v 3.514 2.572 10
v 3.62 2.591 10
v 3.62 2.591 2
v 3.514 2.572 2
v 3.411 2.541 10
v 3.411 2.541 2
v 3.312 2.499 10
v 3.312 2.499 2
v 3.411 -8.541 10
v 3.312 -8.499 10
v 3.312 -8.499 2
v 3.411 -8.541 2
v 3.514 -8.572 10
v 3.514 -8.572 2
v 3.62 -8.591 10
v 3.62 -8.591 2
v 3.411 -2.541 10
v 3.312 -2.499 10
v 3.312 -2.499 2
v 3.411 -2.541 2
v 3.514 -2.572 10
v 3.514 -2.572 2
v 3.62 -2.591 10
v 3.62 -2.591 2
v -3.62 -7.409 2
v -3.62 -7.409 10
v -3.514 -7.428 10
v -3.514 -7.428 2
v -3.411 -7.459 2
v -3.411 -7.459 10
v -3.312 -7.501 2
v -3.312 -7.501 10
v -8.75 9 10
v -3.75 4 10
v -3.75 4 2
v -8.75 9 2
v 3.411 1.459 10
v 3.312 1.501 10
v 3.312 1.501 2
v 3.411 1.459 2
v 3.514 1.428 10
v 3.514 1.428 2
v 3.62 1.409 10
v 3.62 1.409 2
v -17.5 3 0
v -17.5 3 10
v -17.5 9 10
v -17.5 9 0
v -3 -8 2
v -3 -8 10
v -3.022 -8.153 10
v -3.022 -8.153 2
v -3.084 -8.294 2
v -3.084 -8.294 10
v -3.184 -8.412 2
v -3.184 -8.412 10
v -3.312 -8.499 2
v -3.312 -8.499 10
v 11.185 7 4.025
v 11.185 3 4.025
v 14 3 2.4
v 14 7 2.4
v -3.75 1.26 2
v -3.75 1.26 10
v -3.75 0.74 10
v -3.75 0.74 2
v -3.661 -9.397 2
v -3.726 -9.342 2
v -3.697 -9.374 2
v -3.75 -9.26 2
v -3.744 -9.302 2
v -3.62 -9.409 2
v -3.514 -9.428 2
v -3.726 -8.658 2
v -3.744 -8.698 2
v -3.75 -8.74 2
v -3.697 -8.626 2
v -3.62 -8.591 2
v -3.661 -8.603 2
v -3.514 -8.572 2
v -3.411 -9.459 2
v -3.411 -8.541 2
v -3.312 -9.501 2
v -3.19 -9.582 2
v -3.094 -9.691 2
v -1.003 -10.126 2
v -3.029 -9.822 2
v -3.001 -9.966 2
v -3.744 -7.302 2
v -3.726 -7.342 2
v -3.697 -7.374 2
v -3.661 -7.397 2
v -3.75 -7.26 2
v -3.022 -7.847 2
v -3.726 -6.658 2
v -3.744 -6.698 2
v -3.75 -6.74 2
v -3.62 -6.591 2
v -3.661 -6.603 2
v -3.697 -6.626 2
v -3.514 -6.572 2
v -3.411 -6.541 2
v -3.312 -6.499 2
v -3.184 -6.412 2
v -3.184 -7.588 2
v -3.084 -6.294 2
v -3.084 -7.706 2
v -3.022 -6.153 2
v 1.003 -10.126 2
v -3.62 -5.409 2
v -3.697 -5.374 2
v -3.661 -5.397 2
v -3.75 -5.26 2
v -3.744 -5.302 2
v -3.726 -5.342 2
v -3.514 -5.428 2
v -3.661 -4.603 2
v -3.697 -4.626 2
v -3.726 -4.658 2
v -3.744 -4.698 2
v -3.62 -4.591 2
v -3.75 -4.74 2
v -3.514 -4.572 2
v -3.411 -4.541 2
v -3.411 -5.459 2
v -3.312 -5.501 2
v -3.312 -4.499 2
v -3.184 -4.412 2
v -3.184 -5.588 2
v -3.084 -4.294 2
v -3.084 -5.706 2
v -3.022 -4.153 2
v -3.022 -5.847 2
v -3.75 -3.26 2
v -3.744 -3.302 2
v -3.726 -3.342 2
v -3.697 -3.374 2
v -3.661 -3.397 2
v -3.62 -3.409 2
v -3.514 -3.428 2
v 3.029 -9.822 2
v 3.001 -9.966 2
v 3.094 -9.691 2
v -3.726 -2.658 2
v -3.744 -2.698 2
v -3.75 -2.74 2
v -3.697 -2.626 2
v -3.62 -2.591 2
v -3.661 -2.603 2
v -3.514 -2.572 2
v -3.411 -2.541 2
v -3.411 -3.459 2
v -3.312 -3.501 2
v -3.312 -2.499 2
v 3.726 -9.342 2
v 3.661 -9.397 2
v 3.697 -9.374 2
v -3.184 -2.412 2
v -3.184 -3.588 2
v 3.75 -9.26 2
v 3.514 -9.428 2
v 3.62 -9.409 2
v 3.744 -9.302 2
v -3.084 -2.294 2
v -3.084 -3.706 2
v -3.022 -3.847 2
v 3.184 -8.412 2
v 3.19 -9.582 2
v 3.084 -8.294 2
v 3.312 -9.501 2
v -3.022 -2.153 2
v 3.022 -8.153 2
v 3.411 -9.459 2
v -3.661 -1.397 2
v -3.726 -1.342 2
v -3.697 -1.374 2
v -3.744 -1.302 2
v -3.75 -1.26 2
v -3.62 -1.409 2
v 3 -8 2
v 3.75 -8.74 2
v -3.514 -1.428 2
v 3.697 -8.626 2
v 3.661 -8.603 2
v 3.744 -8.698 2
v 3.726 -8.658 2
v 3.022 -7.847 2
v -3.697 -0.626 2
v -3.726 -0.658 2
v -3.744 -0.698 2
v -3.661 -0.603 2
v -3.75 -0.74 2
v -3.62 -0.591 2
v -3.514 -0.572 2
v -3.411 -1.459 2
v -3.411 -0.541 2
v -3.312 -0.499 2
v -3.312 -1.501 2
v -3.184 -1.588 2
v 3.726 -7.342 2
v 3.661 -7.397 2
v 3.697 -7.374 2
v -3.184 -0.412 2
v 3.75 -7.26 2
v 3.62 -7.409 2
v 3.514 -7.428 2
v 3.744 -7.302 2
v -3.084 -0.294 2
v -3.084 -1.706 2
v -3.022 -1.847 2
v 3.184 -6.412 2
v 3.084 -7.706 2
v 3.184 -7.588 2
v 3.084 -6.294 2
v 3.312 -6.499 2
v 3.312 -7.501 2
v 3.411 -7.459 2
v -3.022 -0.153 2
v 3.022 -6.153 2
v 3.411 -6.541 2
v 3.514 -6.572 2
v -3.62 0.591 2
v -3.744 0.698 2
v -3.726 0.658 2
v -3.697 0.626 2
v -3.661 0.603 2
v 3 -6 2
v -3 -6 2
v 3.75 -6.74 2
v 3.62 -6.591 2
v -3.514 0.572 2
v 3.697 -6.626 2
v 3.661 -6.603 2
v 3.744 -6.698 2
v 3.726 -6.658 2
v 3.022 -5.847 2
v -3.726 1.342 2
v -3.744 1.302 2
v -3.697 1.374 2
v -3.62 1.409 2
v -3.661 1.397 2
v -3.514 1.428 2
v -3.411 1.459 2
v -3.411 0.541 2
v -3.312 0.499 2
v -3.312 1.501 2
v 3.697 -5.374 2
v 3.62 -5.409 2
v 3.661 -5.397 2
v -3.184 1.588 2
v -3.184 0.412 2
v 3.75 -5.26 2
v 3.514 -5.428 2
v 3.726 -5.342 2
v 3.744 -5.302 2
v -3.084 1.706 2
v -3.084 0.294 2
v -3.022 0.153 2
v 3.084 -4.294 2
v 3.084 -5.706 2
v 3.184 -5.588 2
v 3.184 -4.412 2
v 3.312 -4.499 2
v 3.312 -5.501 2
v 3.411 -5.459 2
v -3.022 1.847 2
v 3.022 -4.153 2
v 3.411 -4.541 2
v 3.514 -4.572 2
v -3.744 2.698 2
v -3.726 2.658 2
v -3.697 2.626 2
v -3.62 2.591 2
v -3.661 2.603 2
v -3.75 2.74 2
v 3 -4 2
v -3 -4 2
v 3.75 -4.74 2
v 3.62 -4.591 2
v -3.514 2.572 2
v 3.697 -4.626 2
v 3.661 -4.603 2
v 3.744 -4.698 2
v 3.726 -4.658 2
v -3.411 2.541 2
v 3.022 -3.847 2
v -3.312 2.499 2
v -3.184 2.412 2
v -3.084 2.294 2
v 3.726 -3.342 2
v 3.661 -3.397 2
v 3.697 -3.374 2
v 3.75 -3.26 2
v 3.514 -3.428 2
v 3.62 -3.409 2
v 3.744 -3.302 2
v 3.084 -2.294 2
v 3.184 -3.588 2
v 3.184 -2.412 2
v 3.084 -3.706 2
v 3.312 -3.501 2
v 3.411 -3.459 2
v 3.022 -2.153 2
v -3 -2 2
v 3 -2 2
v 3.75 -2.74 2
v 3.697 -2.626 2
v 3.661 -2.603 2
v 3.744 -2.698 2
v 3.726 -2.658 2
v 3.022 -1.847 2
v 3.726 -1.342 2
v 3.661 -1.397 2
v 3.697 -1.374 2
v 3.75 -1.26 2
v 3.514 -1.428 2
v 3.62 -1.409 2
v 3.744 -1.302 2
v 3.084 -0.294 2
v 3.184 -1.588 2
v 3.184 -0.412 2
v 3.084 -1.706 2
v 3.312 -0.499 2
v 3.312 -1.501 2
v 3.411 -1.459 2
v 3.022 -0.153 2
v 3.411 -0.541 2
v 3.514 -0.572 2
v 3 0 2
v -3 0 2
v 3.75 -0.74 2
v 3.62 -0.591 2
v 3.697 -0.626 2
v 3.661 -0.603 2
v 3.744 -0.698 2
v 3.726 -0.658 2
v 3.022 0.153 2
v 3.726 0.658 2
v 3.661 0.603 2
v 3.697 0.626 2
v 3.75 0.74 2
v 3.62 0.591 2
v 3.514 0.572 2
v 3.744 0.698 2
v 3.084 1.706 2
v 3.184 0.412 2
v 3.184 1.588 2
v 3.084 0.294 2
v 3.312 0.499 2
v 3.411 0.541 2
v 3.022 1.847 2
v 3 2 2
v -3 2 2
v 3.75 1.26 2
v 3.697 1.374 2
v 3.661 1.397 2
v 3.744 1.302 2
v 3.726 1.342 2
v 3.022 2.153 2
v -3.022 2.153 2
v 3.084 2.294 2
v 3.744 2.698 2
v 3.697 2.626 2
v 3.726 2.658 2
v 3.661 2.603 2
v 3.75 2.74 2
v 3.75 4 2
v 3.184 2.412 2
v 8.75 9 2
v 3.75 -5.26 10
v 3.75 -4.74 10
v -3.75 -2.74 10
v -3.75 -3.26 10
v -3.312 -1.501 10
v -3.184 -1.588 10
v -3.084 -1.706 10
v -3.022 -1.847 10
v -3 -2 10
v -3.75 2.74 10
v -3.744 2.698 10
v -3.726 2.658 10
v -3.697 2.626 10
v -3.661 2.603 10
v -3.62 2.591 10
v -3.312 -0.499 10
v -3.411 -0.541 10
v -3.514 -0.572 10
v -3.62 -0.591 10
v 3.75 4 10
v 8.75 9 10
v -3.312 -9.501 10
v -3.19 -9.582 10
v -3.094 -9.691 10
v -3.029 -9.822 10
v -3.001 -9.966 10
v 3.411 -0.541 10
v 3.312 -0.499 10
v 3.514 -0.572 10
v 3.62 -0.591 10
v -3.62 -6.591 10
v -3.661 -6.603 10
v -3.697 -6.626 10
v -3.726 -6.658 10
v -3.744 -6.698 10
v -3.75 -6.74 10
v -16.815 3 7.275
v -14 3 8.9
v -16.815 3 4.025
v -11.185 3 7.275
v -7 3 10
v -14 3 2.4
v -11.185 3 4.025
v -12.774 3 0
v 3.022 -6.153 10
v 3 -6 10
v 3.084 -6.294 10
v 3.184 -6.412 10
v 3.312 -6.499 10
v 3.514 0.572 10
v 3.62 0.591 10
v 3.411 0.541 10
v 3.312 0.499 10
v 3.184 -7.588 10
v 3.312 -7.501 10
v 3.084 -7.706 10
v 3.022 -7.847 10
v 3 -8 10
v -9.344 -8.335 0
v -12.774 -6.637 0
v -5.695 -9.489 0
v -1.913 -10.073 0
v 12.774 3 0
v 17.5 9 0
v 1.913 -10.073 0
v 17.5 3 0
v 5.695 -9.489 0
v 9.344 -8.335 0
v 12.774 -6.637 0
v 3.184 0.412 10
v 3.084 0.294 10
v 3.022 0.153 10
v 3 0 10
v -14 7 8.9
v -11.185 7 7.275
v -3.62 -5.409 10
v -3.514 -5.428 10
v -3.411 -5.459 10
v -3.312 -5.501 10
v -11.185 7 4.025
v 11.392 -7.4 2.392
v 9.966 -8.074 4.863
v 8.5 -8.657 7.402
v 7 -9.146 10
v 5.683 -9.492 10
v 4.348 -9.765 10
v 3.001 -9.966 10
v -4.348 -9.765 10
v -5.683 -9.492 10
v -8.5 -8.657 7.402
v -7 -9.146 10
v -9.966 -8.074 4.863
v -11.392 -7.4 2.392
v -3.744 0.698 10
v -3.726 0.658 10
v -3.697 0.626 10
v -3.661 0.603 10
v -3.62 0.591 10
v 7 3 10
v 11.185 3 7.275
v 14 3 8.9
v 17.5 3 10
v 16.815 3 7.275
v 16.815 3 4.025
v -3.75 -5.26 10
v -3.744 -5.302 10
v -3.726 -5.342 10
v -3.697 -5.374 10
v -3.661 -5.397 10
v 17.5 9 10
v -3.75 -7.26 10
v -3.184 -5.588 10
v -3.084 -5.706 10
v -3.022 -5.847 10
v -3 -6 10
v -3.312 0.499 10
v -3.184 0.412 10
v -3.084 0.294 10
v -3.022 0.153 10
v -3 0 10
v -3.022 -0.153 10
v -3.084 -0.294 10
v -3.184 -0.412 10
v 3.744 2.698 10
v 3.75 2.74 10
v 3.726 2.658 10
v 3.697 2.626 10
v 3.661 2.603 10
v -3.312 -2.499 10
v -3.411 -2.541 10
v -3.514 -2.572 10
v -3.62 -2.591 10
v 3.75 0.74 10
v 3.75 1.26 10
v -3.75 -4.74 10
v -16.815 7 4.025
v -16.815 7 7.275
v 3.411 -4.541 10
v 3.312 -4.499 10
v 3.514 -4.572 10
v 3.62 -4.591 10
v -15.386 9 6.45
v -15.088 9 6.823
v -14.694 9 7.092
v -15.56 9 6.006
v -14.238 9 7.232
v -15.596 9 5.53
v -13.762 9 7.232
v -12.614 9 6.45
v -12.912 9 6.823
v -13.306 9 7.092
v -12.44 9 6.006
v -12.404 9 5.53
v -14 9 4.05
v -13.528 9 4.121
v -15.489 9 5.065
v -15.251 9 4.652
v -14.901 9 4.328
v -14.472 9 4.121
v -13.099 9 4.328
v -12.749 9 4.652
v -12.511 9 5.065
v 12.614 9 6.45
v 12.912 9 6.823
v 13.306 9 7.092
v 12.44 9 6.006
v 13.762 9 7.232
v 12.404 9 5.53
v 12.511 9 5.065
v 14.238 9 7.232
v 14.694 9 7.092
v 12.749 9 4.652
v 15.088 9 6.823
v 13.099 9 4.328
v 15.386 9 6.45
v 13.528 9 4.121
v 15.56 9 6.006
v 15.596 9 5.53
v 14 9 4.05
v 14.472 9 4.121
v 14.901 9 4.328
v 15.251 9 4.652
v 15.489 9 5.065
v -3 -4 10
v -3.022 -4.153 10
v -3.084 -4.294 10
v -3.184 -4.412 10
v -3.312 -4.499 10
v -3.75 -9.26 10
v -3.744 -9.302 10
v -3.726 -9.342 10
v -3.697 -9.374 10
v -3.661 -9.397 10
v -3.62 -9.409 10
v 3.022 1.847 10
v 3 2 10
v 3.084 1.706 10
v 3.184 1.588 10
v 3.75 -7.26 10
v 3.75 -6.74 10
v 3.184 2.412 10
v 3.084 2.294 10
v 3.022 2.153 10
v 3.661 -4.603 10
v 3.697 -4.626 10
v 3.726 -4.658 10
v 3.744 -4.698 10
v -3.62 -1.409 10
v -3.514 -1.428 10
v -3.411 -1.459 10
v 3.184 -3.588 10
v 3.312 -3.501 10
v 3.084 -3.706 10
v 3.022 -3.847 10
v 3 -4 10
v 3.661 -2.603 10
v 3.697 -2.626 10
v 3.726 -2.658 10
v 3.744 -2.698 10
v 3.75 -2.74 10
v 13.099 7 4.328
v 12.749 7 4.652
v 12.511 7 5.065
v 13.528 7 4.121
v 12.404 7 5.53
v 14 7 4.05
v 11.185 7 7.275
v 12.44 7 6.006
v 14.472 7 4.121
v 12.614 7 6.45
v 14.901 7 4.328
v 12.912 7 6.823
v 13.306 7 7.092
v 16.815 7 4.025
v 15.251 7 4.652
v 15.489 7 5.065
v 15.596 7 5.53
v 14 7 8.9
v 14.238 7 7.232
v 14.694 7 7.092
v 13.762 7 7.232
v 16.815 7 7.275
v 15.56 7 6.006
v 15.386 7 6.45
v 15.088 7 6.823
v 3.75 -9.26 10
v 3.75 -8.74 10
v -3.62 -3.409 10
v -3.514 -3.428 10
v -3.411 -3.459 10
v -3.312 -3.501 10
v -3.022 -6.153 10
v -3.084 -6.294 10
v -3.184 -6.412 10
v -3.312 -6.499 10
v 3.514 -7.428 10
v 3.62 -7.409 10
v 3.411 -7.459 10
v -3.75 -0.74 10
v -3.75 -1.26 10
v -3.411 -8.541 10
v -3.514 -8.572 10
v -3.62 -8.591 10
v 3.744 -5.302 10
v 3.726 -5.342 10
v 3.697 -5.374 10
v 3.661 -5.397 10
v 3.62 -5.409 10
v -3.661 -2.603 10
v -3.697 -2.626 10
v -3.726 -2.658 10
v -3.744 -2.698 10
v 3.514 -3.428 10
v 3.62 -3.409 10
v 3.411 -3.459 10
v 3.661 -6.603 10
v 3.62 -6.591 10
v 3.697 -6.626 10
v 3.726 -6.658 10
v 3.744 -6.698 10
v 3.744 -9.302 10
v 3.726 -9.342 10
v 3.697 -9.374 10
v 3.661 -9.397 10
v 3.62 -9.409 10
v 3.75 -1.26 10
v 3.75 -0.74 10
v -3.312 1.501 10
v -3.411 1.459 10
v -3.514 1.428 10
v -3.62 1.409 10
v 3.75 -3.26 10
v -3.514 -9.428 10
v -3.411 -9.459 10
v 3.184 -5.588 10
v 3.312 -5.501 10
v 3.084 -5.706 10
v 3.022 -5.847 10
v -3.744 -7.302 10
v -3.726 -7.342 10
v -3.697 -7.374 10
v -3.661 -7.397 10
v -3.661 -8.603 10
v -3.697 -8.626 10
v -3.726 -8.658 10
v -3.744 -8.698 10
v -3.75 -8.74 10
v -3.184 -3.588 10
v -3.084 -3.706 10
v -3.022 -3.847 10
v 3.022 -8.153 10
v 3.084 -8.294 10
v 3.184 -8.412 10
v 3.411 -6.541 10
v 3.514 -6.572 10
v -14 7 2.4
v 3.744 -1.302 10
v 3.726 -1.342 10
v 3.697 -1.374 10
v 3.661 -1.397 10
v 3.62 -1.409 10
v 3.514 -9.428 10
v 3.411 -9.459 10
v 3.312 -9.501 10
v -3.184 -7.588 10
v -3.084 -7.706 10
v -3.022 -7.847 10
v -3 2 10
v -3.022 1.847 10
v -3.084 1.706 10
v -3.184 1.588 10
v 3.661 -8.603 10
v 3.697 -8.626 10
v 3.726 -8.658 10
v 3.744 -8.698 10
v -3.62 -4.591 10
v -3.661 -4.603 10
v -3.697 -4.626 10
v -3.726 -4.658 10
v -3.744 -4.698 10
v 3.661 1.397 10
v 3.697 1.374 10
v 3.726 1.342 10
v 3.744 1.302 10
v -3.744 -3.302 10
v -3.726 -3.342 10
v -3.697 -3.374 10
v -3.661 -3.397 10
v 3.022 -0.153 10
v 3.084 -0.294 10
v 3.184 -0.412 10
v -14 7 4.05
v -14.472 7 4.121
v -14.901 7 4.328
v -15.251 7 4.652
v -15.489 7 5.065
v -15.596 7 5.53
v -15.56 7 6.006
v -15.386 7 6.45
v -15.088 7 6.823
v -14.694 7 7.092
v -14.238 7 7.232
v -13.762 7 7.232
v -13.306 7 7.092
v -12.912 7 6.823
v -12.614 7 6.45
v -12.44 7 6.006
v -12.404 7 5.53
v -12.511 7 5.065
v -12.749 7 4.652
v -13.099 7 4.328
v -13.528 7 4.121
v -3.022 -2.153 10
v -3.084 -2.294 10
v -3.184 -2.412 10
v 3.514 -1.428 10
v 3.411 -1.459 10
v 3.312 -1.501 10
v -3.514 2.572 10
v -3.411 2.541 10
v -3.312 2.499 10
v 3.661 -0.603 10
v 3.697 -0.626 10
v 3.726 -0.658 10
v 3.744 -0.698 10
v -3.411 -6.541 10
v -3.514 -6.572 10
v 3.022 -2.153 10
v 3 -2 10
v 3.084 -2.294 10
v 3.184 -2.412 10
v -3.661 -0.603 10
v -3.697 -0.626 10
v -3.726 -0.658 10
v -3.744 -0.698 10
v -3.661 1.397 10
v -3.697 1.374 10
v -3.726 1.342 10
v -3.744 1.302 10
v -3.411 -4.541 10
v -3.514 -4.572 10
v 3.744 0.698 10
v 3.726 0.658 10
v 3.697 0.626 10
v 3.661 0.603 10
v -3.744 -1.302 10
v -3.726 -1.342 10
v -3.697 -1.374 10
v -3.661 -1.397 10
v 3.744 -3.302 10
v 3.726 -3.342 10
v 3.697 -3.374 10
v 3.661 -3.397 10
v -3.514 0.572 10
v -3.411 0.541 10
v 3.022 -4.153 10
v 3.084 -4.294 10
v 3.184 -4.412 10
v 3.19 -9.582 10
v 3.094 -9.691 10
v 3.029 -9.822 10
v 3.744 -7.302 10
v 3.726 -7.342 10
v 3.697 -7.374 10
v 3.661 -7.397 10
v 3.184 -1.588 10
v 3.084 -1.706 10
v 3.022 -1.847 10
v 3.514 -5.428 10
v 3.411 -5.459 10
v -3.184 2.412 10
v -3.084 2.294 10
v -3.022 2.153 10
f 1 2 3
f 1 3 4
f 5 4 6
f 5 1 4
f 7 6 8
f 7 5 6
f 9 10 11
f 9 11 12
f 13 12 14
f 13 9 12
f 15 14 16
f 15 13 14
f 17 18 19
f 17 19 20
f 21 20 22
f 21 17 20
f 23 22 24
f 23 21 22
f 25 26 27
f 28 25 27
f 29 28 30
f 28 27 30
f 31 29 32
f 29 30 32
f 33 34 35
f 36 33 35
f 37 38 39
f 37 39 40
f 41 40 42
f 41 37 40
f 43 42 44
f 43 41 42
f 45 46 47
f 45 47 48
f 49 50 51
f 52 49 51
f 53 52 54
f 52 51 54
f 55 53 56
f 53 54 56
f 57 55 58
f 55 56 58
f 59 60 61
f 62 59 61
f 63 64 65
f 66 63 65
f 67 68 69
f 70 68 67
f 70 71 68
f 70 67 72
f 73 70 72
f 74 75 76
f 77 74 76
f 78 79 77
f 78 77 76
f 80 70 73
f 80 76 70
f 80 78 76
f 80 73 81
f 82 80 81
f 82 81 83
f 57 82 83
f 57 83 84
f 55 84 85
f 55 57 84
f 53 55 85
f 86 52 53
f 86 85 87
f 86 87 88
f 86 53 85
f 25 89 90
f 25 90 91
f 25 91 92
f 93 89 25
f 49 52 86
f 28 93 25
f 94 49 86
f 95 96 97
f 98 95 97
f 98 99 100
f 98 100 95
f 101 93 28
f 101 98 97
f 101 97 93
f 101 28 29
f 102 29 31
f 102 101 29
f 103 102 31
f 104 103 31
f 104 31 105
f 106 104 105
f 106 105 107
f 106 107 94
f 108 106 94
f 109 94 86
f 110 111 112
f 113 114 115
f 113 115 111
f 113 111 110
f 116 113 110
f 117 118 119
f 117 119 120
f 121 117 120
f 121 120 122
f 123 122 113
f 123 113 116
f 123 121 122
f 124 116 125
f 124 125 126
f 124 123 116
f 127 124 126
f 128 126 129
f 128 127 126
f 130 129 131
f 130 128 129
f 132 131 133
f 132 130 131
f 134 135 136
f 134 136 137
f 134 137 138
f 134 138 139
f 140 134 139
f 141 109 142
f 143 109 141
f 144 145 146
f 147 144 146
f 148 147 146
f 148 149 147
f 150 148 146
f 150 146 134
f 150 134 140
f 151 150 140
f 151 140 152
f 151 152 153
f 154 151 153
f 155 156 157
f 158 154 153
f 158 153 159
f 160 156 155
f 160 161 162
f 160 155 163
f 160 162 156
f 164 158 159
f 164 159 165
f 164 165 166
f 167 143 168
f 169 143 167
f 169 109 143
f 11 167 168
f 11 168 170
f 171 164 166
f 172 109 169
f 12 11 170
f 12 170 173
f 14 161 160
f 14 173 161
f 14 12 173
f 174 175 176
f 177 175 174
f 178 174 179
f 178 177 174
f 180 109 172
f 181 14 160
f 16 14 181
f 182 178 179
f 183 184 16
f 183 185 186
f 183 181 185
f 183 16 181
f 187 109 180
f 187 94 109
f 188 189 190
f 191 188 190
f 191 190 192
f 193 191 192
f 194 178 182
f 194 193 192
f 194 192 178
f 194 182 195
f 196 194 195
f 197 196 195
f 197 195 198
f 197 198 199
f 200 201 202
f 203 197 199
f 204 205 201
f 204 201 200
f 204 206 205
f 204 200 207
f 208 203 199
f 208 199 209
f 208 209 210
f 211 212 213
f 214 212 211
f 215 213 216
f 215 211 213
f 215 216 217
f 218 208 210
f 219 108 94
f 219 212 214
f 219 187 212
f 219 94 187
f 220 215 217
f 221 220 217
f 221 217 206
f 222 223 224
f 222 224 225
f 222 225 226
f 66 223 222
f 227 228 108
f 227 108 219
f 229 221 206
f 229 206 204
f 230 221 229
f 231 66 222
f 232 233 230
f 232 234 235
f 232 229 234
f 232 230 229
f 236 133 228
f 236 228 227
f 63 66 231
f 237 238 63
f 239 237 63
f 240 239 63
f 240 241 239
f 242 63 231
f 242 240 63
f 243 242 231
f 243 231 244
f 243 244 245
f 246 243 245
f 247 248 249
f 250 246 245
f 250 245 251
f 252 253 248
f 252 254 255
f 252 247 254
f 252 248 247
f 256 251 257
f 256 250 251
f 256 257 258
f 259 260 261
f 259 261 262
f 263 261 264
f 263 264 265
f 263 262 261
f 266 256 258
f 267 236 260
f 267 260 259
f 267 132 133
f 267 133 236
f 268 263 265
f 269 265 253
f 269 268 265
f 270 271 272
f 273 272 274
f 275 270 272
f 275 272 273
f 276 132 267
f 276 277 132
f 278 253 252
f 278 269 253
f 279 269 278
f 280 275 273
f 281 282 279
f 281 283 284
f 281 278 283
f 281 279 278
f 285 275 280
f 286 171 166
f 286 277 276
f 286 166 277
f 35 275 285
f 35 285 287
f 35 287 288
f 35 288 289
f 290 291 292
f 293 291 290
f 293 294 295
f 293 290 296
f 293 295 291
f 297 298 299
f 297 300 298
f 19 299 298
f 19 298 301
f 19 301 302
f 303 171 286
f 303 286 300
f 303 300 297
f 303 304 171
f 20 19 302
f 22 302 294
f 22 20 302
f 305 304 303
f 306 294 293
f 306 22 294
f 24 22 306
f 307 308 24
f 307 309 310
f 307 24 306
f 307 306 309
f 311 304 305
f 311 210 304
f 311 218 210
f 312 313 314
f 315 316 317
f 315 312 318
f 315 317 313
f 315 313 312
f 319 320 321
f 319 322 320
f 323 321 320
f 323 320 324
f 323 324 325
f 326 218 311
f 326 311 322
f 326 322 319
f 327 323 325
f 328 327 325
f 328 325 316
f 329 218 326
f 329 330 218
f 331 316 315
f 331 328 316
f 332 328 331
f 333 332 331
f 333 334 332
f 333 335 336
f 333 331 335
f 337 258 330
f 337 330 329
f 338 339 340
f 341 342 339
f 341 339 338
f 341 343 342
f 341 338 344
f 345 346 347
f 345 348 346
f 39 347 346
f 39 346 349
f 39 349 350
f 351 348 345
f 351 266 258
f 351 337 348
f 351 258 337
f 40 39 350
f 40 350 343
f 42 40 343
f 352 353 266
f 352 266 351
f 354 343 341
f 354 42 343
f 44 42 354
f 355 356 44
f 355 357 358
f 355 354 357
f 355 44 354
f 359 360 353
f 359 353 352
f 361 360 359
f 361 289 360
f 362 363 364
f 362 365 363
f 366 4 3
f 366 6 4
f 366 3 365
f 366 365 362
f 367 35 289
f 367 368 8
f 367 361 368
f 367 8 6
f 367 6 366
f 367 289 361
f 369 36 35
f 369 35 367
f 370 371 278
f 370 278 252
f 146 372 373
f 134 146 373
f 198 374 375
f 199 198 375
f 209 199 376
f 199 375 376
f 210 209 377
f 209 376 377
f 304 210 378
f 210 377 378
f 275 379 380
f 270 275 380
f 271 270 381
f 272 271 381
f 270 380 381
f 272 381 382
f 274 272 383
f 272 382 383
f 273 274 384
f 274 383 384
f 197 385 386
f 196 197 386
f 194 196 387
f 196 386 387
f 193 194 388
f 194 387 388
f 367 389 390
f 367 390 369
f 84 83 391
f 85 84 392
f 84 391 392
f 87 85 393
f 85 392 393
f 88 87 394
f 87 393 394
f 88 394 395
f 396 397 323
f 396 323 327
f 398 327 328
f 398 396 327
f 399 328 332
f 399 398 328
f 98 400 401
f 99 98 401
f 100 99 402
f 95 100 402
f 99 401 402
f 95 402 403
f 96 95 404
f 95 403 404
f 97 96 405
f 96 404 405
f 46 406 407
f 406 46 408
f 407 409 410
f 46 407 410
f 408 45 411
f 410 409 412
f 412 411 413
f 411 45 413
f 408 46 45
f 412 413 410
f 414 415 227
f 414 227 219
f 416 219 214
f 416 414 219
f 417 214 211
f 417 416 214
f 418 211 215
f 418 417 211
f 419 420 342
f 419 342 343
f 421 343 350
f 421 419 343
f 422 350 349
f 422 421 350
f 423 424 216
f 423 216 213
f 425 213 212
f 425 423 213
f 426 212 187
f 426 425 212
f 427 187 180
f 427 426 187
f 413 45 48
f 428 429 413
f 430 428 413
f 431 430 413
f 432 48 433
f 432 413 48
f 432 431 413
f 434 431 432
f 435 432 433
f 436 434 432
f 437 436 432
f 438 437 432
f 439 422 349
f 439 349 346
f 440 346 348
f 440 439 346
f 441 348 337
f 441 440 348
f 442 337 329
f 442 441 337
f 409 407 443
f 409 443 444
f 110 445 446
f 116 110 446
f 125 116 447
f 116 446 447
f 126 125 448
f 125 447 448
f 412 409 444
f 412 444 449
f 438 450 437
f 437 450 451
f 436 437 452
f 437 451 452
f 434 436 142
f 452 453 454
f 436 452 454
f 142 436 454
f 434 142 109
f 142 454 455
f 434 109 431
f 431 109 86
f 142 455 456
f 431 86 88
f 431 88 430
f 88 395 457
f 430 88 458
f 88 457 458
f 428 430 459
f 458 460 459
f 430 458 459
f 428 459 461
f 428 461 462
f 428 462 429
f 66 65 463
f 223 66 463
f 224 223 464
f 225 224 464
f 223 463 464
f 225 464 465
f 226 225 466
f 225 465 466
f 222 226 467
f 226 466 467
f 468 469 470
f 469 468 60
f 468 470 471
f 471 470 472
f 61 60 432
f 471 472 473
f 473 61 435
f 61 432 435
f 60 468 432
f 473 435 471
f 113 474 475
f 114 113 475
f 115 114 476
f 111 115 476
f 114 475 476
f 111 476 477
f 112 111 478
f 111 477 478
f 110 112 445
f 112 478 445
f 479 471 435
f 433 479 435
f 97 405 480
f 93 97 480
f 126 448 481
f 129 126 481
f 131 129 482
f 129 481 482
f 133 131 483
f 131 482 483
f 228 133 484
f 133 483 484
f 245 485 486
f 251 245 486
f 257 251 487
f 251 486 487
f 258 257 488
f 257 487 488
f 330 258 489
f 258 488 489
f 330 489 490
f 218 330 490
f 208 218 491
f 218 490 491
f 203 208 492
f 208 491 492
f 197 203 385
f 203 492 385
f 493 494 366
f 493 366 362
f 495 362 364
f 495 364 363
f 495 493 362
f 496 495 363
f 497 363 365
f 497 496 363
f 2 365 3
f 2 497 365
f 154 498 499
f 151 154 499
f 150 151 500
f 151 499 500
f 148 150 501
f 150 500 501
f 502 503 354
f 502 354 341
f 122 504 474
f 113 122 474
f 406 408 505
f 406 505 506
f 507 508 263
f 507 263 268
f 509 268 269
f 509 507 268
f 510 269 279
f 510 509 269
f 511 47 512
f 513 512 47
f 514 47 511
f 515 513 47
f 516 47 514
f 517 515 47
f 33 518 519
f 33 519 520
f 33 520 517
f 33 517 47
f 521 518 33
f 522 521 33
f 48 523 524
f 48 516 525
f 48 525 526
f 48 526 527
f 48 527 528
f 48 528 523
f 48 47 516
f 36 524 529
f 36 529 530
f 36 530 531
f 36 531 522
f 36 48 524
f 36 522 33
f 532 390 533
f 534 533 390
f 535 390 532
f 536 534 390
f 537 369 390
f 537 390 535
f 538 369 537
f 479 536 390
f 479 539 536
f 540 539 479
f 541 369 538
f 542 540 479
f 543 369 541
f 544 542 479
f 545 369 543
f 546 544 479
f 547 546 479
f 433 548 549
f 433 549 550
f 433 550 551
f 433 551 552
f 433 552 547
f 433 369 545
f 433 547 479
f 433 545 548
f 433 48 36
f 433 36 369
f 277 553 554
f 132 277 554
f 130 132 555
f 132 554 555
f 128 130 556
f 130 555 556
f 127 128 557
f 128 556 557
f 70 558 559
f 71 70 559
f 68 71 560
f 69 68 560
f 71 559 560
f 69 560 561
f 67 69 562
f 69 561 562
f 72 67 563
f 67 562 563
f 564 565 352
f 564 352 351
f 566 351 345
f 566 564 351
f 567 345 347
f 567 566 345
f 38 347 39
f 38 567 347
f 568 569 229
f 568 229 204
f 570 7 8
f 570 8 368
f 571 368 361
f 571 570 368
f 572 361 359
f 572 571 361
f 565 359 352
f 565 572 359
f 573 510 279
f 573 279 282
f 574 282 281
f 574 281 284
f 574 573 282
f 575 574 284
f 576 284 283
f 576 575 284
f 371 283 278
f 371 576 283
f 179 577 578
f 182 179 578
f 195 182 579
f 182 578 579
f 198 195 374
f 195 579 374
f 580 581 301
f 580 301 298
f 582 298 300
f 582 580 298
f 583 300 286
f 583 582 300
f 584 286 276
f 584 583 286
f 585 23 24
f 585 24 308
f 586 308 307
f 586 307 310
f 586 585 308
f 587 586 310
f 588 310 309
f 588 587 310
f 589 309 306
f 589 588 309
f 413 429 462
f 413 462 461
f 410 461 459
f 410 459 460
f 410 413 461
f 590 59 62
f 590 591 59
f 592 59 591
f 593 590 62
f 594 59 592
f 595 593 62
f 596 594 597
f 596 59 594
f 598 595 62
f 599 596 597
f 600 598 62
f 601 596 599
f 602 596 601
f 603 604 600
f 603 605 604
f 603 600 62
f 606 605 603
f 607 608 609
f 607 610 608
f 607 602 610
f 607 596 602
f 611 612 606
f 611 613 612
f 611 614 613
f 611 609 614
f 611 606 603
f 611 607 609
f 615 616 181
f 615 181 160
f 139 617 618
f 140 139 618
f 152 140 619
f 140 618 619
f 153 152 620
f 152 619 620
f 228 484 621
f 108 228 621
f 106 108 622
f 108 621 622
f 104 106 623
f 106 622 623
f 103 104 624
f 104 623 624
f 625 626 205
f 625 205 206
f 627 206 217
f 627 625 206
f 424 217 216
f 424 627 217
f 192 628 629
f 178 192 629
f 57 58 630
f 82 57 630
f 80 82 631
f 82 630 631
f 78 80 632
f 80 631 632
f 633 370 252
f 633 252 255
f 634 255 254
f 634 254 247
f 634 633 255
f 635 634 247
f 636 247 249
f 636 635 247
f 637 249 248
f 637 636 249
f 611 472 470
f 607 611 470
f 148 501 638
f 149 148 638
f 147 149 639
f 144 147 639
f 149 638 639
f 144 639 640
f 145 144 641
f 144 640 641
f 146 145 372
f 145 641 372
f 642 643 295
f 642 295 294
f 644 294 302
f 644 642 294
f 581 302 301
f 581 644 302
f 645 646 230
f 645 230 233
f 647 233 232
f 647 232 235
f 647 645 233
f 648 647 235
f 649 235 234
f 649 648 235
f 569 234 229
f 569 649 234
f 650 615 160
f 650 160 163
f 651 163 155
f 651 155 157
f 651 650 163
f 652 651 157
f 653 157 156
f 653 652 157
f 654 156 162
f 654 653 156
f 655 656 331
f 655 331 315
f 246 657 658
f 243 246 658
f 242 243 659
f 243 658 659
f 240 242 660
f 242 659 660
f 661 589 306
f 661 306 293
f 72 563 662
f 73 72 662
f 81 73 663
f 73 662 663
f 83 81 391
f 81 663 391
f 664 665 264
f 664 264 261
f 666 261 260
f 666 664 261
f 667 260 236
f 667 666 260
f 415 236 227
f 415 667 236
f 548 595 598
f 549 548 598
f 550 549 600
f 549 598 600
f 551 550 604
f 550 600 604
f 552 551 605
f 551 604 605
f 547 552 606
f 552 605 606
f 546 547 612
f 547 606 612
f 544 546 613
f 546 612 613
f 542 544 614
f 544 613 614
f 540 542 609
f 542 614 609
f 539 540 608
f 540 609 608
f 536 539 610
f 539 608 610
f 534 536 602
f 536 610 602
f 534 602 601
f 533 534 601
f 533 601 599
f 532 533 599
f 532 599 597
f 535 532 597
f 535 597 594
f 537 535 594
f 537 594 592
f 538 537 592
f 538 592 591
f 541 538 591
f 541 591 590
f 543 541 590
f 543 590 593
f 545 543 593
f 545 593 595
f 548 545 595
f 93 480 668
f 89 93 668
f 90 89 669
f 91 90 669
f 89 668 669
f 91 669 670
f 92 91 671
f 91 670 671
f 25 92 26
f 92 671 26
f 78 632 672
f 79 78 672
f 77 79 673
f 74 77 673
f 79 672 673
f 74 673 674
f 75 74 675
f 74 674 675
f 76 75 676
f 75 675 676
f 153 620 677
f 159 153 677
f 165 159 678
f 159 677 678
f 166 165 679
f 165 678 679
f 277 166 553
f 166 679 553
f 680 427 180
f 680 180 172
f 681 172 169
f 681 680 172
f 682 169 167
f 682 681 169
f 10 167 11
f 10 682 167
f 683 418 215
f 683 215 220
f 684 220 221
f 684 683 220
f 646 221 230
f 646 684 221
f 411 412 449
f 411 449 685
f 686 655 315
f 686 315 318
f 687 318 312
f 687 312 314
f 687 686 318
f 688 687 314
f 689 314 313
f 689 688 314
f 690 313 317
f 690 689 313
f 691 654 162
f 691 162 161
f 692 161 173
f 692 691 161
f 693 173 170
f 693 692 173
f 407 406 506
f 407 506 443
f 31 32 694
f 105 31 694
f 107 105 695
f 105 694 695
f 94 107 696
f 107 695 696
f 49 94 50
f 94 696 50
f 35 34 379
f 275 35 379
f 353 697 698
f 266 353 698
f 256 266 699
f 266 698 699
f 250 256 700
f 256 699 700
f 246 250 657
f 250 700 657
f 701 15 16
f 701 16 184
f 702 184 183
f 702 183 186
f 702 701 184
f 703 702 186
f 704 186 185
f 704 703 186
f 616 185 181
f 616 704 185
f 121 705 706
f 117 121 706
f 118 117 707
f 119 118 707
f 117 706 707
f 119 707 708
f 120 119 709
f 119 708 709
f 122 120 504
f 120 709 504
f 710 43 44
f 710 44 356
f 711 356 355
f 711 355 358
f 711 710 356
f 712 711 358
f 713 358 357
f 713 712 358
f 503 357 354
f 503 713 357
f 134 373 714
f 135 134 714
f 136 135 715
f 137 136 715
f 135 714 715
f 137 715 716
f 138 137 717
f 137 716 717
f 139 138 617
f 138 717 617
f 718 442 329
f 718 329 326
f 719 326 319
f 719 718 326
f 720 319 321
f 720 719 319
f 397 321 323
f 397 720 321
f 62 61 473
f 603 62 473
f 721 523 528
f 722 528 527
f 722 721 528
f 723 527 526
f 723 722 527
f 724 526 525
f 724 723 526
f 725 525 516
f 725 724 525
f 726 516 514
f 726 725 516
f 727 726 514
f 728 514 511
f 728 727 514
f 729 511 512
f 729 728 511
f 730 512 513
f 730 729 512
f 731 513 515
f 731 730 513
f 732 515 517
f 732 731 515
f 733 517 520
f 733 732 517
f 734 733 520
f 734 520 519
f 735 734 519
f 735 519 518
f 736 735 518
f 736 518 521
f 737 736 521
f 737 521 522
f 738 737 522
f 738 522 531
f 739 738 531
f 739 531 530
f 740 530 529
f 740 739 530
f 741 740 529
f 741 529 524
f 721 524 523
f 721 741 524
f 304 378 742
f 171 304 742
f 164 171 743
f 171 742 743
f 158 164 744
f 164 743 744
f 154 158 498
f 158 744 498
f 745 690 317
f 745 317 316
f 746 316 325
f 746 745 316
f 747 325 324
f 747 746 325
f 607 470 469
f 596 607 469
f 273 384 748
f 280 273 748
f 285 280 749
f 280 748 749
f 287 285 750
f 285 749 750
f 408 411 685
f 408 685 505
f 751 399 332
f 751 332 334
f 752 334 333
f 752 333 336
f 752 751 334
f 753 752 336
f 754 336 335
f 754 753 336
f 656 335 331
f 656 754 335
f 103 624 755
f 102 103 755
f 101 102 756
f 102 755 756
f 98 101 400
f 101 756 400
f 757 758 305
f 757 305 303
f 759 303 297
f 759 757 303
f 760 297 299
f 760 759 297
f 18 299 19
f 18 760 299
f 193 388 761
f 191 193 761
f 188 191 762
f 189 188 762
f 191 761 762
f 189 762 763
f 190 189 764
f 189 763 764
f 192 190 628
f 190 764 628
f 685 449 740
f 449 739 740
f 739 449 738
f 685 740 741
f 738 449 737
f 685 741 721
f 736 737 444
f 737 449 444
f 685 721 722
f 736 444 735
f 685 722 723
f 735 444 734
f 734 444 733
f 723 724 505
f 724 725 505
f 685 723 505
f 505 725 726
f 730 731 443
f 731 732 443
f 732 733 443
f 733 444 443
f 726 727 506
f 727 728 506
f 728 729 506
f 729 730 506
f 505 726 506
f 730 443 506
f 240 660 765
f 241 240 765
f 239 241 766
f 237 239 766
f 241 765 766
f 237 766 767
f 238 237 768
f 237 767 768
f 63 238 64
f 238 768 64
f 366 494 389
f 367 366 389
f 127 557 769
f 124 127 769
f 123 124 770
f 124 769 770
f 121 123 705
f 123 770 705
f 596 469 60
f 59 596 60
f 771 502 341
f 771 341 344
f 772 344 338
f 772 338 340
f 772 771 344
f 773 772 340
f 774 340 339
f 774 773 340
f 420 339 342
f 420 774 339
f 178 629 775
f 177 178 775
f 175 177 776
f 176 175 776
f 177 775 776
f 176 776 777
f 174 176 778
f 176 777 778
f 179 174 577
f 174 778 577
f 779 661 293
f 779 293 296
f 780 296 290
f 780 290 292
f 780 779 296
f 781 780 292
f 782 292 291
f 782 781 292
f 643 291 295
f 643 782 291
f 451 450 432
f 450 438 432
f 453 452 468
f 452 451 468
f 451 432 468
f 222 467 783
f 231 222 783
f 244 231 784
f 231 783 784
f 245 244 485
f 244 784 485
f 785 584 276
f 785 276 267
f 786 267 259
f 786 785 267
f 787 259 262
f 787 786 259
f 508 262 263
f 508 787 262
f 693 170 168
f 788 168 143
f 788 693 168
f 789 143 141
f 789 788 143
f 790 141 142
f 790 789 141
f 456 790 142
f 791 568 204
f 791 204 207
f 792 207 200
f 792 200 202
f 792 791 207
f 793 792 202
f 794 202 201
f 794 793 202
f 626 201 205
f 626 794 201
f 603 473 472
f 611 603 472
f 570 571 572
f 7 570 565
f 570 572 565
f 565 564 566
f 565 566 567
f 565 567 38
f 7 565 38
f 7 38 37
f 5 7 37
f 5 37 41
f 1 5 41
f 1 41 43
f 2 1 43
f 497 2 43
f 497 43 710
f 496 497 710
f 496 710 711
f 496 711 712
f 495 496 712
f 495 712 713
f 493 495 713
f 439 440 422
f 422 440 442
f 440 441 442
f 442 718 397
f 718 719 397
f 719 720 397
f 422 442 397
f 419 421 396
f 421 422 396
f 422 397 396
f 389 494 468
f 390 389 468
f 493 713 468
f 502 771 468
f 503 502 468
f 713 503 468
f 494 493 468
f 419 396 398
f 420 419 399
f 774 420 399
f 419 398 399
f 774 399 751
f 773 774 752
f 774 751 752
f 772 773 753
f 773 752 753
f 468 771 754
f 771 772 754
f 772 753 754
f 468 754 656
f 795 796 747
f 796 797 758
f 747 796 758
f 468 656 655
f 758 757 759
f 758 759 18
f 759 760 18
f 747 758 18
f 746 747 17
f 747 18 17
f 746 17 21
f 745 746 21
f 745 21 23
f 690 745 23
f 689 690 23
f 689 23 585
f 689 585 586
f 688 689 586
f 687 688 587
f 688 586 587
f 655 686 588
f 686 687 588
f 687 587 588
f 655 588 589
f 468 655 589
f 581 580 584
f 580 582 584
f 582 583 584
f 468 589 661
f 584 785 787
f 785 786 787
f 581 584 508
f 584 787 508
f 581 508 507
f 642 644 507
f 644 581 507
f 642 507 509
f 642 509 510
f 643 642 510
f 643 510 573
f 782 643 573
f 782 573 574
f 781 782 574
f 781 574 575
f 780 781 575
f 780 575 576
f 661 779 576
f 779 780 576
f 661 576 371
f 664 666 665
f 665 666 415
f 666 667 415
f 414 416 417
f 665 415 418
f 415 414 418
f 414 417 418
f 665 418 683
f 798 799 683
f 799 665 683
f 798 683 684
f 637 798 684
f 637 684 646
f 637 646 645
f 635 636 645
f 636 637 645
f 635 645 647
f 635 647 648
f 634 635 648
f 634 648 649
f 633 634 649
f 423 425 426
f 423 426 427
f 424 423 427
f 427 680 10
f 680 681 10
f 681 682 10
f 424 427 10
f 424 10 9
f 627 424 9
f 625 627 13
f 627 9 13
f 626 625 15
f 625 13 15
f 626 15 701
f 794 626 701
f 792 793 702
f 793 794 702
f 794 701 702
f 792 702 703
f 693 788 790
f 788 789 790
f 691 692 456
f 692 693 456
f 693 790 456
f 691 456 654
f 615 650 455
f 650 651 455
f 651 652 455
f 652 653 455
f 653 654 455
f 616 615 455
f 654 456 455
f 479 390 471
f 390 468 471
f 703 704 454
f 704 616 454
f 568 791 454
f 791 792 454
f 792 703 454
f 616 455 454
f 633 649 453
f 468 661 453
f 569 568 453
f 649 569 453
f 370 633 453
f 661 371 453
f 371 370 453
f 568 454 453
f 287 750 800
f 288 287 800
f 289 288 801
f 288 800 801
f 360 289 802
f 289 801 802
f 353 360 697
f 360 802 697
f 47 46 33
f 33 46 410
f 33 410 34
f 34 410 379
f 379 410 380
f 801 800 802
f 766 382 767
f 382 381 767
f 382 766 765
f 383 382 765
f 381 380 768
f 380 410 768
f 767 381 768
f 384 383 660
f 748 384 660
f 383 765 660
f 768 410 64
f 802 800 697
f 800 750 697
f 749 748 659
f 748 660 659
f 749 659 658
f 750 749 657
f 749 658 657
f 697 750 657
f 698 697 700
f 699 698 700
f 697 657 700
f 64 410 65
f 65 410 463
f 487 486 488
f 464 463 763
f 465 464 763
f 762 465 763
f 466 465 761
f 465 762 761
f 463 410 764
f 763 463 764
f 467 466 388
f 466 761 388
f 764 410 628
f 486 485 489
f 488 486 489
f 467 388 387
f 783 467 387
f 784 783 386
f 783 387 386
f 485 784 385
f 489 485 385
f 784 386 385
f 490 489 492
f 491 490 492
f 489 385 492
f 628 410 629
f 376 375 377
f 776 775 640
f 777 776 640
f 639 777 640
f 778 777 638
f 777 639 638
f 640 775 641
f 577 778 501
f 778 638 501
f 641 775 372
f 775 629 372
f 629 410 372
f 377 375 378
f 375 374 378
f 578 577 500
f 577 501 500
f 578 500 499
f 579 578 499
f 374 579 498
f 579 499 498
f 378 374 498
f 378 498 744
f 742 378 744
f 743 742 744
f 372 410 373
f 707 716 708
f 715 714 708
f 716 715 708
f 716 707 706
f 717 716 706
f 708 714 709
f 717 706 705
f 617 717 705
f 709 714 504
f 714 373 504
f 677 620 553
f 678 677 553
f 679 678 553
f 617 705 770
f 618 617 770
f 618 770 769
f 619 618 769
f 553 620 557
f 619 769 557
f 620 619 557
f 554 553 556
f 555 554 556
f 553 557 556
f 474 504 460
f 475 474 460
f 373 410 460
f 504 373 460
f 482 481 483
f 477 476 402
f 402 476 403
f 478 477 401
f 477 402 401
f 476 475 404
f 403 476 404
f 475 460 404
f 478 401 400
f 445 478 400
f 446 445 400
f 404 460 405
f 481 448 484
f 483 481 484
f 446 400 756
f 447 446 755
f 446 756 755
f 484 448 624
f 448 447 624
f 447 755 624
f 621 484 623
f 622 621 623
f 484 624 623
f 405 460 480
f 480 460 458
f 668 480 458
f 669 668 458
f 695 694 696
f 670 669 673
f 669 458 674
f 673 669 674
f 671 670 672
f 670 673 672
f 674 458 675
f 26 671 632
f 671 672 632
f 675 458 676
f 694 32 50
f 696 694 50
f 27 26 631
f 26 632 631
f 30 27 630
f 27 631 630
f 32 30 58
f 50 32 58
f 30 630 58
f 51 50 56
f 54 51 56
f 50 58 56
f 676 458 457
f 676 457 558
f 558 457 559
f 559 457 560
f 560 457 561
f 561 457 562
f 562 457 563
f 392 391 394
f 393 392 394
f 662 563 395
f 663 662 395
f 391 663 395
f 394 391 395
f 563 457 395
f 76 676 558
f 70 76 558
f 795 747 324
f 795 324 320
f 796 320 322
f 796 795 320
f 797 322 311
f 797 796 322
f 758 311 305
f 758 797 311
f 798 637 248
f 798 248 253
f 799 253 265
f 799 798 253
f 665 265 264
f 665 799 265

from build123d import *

# Parameters (mm, degrees)
SKETCH1_W            = 35
SKETCH1_H            = 6
BOSS_EXTRUDE1_DEPTH  = 10
BOSS_EXTRUDE2_DEPTH  = 10
SKETCH4_W            = 6
SKETCH4_H            = 13.146428929
CUT_EXTRUDE1_DEPTH   = 8
CUT_EXTRUDE2_DEPTH   = 8
LPATTERN2_COUNT      = 10
LPATTERN2_PITCH      = 2
MIRROR1_COPY_1_DEPTH = 8
MIRROR1_COPY_2_DEPTH = 8
MIRROR1_COPY_3_DEPTH = 8
MIRROR1_COPY_4_DEPTH = 8
MIRROR1_COPY_5_DEPTH = 8
MIRROR1_COPY_6_DEPTH = 8
MIRROR1_COPY_7_DEPTH = 8
MIRROR1_COPY_8_DEPTH = 8
MIRROR1_COPY_9_DEPTH = 8
CUT_EXTRUDE3_DEPTH   = 25.064051894
SKETCH7_W            = 35
SKETCH7_H            = 10
BOSS_EXTRUDE3_DEPTH  = 6
SKETCH8_W            = 7.5
SKETCH8_H            = 6
CUT_EXTRUDE4_DEPTH   = 8
CUT_EXTRUDE5_DEPTH   = 4
SKETCH10_R           = 1.6
CUT_EXTRUDE6_DEPTH   = 27.462237717
CHAMFER1_SIZE        = 5


with BuildPart() as part:
    # Sketch1 → Boss-Extrude1 (new body)
    with BuildSketch(Plane.XY):
        Rectangle(SKETCH1_W, SKETCH1_H)
    extrude(amount=BOSS_EXTRUDE1_DEPTH)

    # Sketch2 → Boss-Extrude2 (add)
    with BuildSketch(Plane.XY.offset(10)):
        with BuildLine():
            Line((-17.5, -3), (17.5, -3))
            ThreePointArc((17.5, -3), (0, -10.146428929), (-17.5, -3))
        make_face()
    extrude(amount=-BOSS_EXTRUDE2_DEPTH)

    # Sketch4 → Cut-Extrude1 (cut)
    with BuildSketch(Plane.XY.offset(10)):
        with Locations((0, -3.573214465)):
            Rectangle(SKETCH4_W, SKETCH4_H)
    extrude(amount=-CUT_EXTRUDE1_DEPTH, mode=Mode.SUBTRACT)

    # Sketch5 → Cut-Extrude2 (cut)
    with BuildSketch(Plane.XY.offset(10)):
        with BuildLine():
            Line((3, 2), (3, 4))
            ThreePointArc((3, 4), (3.084360941, 3.705850588), (3.311797753, 3.501123596))
            ThreePointArc((3.311797753, 3.501123596), (3.461937846, 3.442388286), (3.619565217, 3.408543109))
            ThreePointArc((3.619565217, 3.408543109), (3.712771412, 3.358731646), (3.75, 3.259824575))
            Line((3.75, 3.259824575), (3.75, 2.740175425))
            ThreePointArc((3.75, 2.740175425), (3.712771412, 2.641268354), (3.619565217, 2.591456891))
            ThreePointArc((3.619565217, 2.591456891), (3.461937846, 2.557611714), (3.311797753, 2.498876404))
            ThreePointArc((3.311797753, 2.498876404), (3.084360941, 2.294149412), (3, 2))
        make_face()
    cut_extrude2 = extrude(amount=-CUT_EXTRUDE2_DEPTH, mode=Mode.SUBTRACT)

    # LPattern2: Cut-Extrude2 ×10
    with Locations(*[(0, -i * LPATTERN2_PITCH, 0) for i in range(1, LPATTERN2_COUNT)]):
        add(cut_extrude2, mode=Mode.SUBTRACT)

    # Mirror1: Cut-Extrude2 across plane
    add(cut_extrude2.mirror(Plane(origin=(0, 0, 0), x_dir=(0, 0, 1), z_dir=(1, 0, 0))), mode=Mode.SUBTRACT)

    # Mirror1 copy 1 sketch → Mirror1 copy 1 (cut)
    with BuildSketch(Plane(origin=(0, -2, 10), x_dir=(-1, 0, 0), z_dir=(0, 0, 1))):
        with BuildLine():
            Line((3, -2), (3, -4))
            ThreePointArc((3, -4), (3.084360941, -3.705850588), (3.311797753, -3.501123596))
            ThreePointArc((3.311797753, -3.501123596), (3.461937846, -3.442388286), (3.619565217, -3.408543109))
            ThreePointArc((3.619565217, -3.408543109), (3.712771412, -3.358731646), (3.75, -3.259824575))
            Line((3.75, -3.259824575), (3.75, -2.740175425))
            ThreePointArc((3.75, -2.740175425), (3.712771412, -2.641268354), (3.619565217, -2.591456891))
            ThreePointArc((3.619565217, -2.591456891), (3.461937846, -2.557611714), (3.311797753, -2.498876404))
            ThreePointArc((3.311797753, -2.498876404), (3.084360941, -2.294149412), (3, -2))
        make_face()
    extrude(amount=-MIRROR1_COPY_1_DEPTH, mode=Mode.SUBTRACT)

    # Mirror1 copy 2 sketch → Mirror1 copy 2 (cut)
    with BuildSketch(Plane(origin=(0, -4, 10), x_dir=(-1, 0, 0), z_dir=(0, 0, 1))):
        with BuildLine():
            Line((3, -2), (3, -4))
            ThreePointArc((3, -4), (3.084360941, -3.705850588), (3.311797753, -3.501123596))
            ThreePointArc((3.311797753, -3.501123596), (3.461937846, -3.442388286), (3.619565217, -3.408543109))
            ThreePointArc((3.619565217, -3.408543109), (3.712771412, -3.358731646), (3.75, -3.259824575))
            Line((3.75, -3.259824575), (3.75, -2.740175425))
            ThreePointArc((3.75, -2.740175425), (3.712771412, -2.641268354), (3.619565217, -2.591456891))
            ThreePointArc((3.619565217, -2.591456891), (3.461937846, -2.557611714), (3.311797753, -2.498876404))
            ThreePointArc((3.311797753, -2.498876404), (3.084360941, -2.294149412), (3, -2))
        make_face()
    extrude(amount=-MIRROR1_COPY_2_DEPTH, mode=Mode.SUBTRACT)

    # Mirror1 copy 3 sketch → Mirror1 copy 3 (cut)
    with BuildSketch(Plane(origin=(0, -6, 10), x_dir=(-1, 0, 0), z_dir=(0, 0, 1))):
        with BuildLine():
            Line((3, -2), (3, -4))
            ThreePointArc((3, -4), (3.084360941, -3.705850588), (3.311797753, -3.501123596))
            ThreePointArc((3.311797753, -3.501123596), (3.461937846, -3.442388286), (3.619565217, -3.408543109))
            ThreePointArc((3.619565217, -3.408543109), (3.712771412, -3.358731646), (3.75, -3.259824575))
            Line((3.75, -3.259824575), (3.75, -2.740175425))
            ThreePointArc((3.75, -2.740175425), (3.712771412, -2.641268354), (3.619565217, -2.591456891))
            ThreePointArc((3.619565217, -2.591456891), (3.461937846, -2.557611714), (3.311797753, -2.498876404))
            ThreePointArc((3.311797753, -2.498876404), (3.084360941, -2.294149412), (3, -2))
        make_face()
    extrude(amount=-MIRROR1_COPY_3_DEPTH, mode=Mode.SUBTRACT)

    # Mirror1 copy 4 sketch → Mirror1 copy 4 (cut)
    with BuildSketch(Plane(origin=(0, -8, 10), x_dir=(-1, 0, 0), z_dir=(0, 0, 1))):
        with BuildLine():
            Line((3, -2), (3, -4))
            ThreePointArc((3, -4), (3.084360941, -3.705850588), (3.311797753, -3.501123596))
            ThreePointArc((3.311797753, -3.501123596), (3.461937846, -3.442388286), (3.619565217, -3.408543109))
            ThreePointArc((3.619565217, -3.408543109), (3.712771412, -3.358731646), (3.75, -3.259824575))
            Line((3.75, -3.259824575), (3.75, -2.740175425))
            ThreePointArc((3.75, -2.740175425), (3.712771412, -2.641268354), (3.619565217, -2.591456891))
            ThreePointArc((3.619565217, -2.591456891), (3.461937846, -2.557611714), (3.311797753, -2.498876404))
            ThreePointArc((3.311797753, -2.498876404), (3.084360941, -2.294149412), (3, -2))
        make_face()
    extrude(amount=-MIRROR1_COPY_4_DEPTH, mode=Mode.SUBTRACT)

    # Mirror1 copy 5 sketch → Mirror1 copy 5 (cut)
    with BuildSketch(Plane(origin=(0, -10, 10), x_dir=(-1, 0, 0), z_dir=(0, 0, 1))):
        with BuildLine():
            Line((3, -2), (3, -4))
            ThreePointArc((3, -4), (3.084360941, -3.705850588), (3.311797753, -3.501123596))
            ThreePointArc((3.311797753, -3.501123596), (3.461937846, -3.442388286), (3.619565217, -3.408543109))
            ThreePointArc((3.619565217, -3.408543109), (3.712771412, -3.358731646), (3.75, -3.259824575))
            Line((3.75, -3.259824575), (3.75, -2.740175425))
            ThreePointArc((3.75, -2.740175425), (3.712771412, -2.641268354), (3.619565217, -2.591456891))
            ThreePointArc((3.619565217, -2.591456891), (3.461937846, -2.557611714), (3.311797753, -2.498876404))
            ThreePointArc((3.311797753, -2.498876404), (3.084360941, -2.294149412), (3, -2))
        make_face()
    extrude(amount=-MIRROR1_COPY_5_DEPTH, mode=Mode.SUBTRACT)

    # Mirror1 copy 6 sketch → Mirror1 copy 6 (cut)
    with BuildSketch(Plane(origin=(0, -12, 10), x_dir=(-1, 0, 0), z_dir=(0, 0, 1))):
        with BuildLine():
            Line((3, -2), (3, -4))
            ThreePointArc((3, -4), (3.084360941, -3.705850588), (3.311797753, -3.501123596))
            ThreePointArc((3.311797753, -3.501123596), (3.461937846, -3.442388286), (3.619565217, -3.408543109))
            ThreePointArc((3.619565217, -3.408543109), (3.712771412, -3.358731646), (3.75, -3.259824575))
            Line((3.75, -3.259824575), (3.75, -2.740175425))
            ThreePointArc((3.75, -2.740175425), (3.712771412, -2.641268354), (3.619565217, -2.591456891))
            ThreePointArc((3.619565217, -2.591456891), (3.461937846, -2.557611714), (3.311797753, -2.498876404))
            ThreePointArc((3.311797753, -2.498876404), (3.084360941, -2.294149412), (3, -2))
        make_face()
    extrude(amount=-MIRROR1_COPY_6_DEPTH, mode=Mode.SUBTRACT)

    # Mirror1 copy 7 sketch → Mirror1 copy 7 (cut)
    with BuildSketch(Plane(origin=(0, -14, 10), x_dir=(-1, 0, 0), z_dir=(0, 0, 1))):
        with BuildLine():
            Line((3, -2), (3, -4))
            ThreePointArc((3, -4), (3.084360941, -3.705850588), (3.311797753, -3.501123596))
            ThreePointArc((3.311797753, -3.501123596), (3.461937846, -3.442388286), (3.619565217, -3.408543109))
            ThreePointArc((3.619565217, -3.408543109), (3.712771412, -3.358731646), (3.75, -3.259824575))
            Line((3.75, -3.259824575), (3.75, -2.740175425))
            ThreePointArc((3.75, -2.740175425), (3.712771412, -2.641268354), (3.619565217, -2.591456891))
            ThreePointArc((3.619565217, -2.591456891), (3.461937846, -2.557611714), (3.311797753, -2.498876404))
            ThreePointArc((3.311797753, -2.498876404), (3.084360941, -2.294149412), (3, -2))
        make_face()
    extrude(amount=-MIRROR1_COPY_7_DEPTH, mode=Mode.SUBTRACT)

    # Mirror1 copy 8 sketch → Mirror1 copy 8 (cut)
    with BuildSketch(Plane(origin=(0, -16, 10), x_dir=(-1, 0, 0), z_dir=(0, 0, 1))):
        with BuildLine():
            Line((3, -2), (3, -4))
            ThreePointArc((3, -4), (3.084360941, -3.705850588), (3.311797753, -3.501123596))
            ThreePointArc((3.311797753, -3.501123596), (3.461937846, -3.442388286), (3.619565217, -3.408543109))
            ThreePointArc((3.619565217, -3.408543109), (3.712771412, -3.358731646), (3.75, -3.259824575))
            Line((3.75, -3.259824575), (3.75, -2.740175425))
            ThreePointArc((3.75, -2.740175425), (3.712771412, -2.641268354), (3.619565217, -2.591456891))
            ThreePointArc((3.619565217, -2.591456891), (3.461937846, -2.557611714), (3.311797753, -2.498876404))
            ThreePointArc((3.311797753, -2.498876404), (3.084360941, -2.294149412), (3, -2))
        make_face()
    extrude(amount=-MIRROR1_COPY_8_DEPTH, mode=Mode.SUBTRACT)

    # Mirror1 copy 9 sketch → Mirror1 copy 9 (cut)
    with BuildSketch(Plane(origin=(0, -18, 10), x_dir=(-1, 0, 0), z_dir=(0, 0, 1))):
        with BuildLine():
            Line((3, -2), (3, -4))
            ThreePointArc((3, -4), (3.084360941, -3.705850588), (3.311797753, -3.501123596))
            ThreePointArc((3.311797753, -3.501123596), (3.461937846, -3.442388286), (3.619565217, -3.408543109))
            ThreePointArc((3.619565217, -3.408543109), (3.712771412, -3.358731646), (3.75, -3.259824575))
            Line((3.75, -3.259824575), (3.75, -2.740175425))
            ThreePointArc((3.75, -2.740175425), (3.712771412, -2.641268354), (3.619565217, -2.591456891))
            ThreePointArc((3.619565217, -2.591456891), (3.461937846, -2.557611714), (3.311797753, -2.498876404))
            ThreePointArc((3.311797753, -2.498876404), (3.084360941, -2.294149412), (3, -2))
        make_face()
    extrude(amount=-MIRROR1_COPY_9_DEPTH, mode=Mode.SUBTRACT)

    # Sketch6 → Cut-Extrude3 (cut, through all)
    with BuildSketch(Plane(origin=(0, 3, 0), x_dir=(1, 0, 0), z_dir=(0, 1, 0))):
        Polygon((-17.5, 0), (-12.773502692, 0), (-7, -10), (-17.5, -10), align=None)
    cut_extrude3 = extrude(amount=-CUT_EXTRUDE3_DEPTH, mode=Mode.SUBTRACT)

    # Mirror2: Cut-Extrude3 across plane
    add(cut_extrude3.mirror(Plane(origin=(0, 0, 0), x_dir=(0, 0, 1), z_dir=(1, 0, 0))), mode=Mode.SUBTRACT)

    # Sketch7 → Boss-Extrude3 (add)
    with BuildSketch(Plane(origin=(0, 3, 0), x_dir=(1, 0, 0), z_dir=(0, 1, 0))):
        with Locations((0, -5)):
            Rectangle(SKETCH7_W, SKETCH7_H)
    extrude(amount=BOSS_EXTRUDE3_DEPTH)

    # Sketch8 → Cut-Extrude4 (cut)
    with BuildSketch(Plane.XY.offset(10)):
        with Locations((0, 6)):
            Rectangle(SKETCH8_W, SKETCH8_H)
    extrude(amount=-CUT_EXTRUDE4_DEPTH, mode=Mode.SUBTRACT)

    # Sketch9 → Cut-Extrude5 (cut)
    with BuildSketch(Plane.XZ.offset(-3)):
        Polygon((16.814582562, 4.025), (16.814582562, 7.275), (14, 8.9), (11.185417438, 7.275), (11.185417438, 4.025), (14, 2.4), align=None)
    cut_extrude5 = extrude(amount=-CUT_EXTRUDE5_DEPTH, mode=Mode.SUBTRACT)

    # Mirror3: Cut-Extrude5 across plane
    add(cut_extrude5.mirror(Plane(origin=(0, 0, 0), x_dir=(0, 0, 1), z_dir=(1, 0, 0))), mode=Mode.SUBTRACT)

    # Sketch10 → Cut-Extrude6 (cut, through all)
    with BuildSketch(Plane.XZ.offset(-7)):
        with Locations(Location((14, 5.65, 0), (0, 0, 270))):
            Circle(SKETCH10_R)
    cut_extrude6 = extrude(amount=-CUT_EXTRUDE6_DEPTH, mode=Mode.SUBTRACT)

    # Mirror4: Cut-Extrude6 across plane
    add(cut_extrude6.mirror(Plane(origin=(0, 0, 0), x_dir=(0, 0, 1), z_dir=(1, 0, 0))), mode=Mode.SUBTRACT)

    # Chamfer1
    chamfer1_edges = [part.edges().sort_by_distance(p)[0] for p in [
        (-3.75, 9, 6),
        (3.75, 9, 6),
    ]]
    chamfer(chamfer1_edges, length=CHAMFER1_SIZE)


solid = part.part
